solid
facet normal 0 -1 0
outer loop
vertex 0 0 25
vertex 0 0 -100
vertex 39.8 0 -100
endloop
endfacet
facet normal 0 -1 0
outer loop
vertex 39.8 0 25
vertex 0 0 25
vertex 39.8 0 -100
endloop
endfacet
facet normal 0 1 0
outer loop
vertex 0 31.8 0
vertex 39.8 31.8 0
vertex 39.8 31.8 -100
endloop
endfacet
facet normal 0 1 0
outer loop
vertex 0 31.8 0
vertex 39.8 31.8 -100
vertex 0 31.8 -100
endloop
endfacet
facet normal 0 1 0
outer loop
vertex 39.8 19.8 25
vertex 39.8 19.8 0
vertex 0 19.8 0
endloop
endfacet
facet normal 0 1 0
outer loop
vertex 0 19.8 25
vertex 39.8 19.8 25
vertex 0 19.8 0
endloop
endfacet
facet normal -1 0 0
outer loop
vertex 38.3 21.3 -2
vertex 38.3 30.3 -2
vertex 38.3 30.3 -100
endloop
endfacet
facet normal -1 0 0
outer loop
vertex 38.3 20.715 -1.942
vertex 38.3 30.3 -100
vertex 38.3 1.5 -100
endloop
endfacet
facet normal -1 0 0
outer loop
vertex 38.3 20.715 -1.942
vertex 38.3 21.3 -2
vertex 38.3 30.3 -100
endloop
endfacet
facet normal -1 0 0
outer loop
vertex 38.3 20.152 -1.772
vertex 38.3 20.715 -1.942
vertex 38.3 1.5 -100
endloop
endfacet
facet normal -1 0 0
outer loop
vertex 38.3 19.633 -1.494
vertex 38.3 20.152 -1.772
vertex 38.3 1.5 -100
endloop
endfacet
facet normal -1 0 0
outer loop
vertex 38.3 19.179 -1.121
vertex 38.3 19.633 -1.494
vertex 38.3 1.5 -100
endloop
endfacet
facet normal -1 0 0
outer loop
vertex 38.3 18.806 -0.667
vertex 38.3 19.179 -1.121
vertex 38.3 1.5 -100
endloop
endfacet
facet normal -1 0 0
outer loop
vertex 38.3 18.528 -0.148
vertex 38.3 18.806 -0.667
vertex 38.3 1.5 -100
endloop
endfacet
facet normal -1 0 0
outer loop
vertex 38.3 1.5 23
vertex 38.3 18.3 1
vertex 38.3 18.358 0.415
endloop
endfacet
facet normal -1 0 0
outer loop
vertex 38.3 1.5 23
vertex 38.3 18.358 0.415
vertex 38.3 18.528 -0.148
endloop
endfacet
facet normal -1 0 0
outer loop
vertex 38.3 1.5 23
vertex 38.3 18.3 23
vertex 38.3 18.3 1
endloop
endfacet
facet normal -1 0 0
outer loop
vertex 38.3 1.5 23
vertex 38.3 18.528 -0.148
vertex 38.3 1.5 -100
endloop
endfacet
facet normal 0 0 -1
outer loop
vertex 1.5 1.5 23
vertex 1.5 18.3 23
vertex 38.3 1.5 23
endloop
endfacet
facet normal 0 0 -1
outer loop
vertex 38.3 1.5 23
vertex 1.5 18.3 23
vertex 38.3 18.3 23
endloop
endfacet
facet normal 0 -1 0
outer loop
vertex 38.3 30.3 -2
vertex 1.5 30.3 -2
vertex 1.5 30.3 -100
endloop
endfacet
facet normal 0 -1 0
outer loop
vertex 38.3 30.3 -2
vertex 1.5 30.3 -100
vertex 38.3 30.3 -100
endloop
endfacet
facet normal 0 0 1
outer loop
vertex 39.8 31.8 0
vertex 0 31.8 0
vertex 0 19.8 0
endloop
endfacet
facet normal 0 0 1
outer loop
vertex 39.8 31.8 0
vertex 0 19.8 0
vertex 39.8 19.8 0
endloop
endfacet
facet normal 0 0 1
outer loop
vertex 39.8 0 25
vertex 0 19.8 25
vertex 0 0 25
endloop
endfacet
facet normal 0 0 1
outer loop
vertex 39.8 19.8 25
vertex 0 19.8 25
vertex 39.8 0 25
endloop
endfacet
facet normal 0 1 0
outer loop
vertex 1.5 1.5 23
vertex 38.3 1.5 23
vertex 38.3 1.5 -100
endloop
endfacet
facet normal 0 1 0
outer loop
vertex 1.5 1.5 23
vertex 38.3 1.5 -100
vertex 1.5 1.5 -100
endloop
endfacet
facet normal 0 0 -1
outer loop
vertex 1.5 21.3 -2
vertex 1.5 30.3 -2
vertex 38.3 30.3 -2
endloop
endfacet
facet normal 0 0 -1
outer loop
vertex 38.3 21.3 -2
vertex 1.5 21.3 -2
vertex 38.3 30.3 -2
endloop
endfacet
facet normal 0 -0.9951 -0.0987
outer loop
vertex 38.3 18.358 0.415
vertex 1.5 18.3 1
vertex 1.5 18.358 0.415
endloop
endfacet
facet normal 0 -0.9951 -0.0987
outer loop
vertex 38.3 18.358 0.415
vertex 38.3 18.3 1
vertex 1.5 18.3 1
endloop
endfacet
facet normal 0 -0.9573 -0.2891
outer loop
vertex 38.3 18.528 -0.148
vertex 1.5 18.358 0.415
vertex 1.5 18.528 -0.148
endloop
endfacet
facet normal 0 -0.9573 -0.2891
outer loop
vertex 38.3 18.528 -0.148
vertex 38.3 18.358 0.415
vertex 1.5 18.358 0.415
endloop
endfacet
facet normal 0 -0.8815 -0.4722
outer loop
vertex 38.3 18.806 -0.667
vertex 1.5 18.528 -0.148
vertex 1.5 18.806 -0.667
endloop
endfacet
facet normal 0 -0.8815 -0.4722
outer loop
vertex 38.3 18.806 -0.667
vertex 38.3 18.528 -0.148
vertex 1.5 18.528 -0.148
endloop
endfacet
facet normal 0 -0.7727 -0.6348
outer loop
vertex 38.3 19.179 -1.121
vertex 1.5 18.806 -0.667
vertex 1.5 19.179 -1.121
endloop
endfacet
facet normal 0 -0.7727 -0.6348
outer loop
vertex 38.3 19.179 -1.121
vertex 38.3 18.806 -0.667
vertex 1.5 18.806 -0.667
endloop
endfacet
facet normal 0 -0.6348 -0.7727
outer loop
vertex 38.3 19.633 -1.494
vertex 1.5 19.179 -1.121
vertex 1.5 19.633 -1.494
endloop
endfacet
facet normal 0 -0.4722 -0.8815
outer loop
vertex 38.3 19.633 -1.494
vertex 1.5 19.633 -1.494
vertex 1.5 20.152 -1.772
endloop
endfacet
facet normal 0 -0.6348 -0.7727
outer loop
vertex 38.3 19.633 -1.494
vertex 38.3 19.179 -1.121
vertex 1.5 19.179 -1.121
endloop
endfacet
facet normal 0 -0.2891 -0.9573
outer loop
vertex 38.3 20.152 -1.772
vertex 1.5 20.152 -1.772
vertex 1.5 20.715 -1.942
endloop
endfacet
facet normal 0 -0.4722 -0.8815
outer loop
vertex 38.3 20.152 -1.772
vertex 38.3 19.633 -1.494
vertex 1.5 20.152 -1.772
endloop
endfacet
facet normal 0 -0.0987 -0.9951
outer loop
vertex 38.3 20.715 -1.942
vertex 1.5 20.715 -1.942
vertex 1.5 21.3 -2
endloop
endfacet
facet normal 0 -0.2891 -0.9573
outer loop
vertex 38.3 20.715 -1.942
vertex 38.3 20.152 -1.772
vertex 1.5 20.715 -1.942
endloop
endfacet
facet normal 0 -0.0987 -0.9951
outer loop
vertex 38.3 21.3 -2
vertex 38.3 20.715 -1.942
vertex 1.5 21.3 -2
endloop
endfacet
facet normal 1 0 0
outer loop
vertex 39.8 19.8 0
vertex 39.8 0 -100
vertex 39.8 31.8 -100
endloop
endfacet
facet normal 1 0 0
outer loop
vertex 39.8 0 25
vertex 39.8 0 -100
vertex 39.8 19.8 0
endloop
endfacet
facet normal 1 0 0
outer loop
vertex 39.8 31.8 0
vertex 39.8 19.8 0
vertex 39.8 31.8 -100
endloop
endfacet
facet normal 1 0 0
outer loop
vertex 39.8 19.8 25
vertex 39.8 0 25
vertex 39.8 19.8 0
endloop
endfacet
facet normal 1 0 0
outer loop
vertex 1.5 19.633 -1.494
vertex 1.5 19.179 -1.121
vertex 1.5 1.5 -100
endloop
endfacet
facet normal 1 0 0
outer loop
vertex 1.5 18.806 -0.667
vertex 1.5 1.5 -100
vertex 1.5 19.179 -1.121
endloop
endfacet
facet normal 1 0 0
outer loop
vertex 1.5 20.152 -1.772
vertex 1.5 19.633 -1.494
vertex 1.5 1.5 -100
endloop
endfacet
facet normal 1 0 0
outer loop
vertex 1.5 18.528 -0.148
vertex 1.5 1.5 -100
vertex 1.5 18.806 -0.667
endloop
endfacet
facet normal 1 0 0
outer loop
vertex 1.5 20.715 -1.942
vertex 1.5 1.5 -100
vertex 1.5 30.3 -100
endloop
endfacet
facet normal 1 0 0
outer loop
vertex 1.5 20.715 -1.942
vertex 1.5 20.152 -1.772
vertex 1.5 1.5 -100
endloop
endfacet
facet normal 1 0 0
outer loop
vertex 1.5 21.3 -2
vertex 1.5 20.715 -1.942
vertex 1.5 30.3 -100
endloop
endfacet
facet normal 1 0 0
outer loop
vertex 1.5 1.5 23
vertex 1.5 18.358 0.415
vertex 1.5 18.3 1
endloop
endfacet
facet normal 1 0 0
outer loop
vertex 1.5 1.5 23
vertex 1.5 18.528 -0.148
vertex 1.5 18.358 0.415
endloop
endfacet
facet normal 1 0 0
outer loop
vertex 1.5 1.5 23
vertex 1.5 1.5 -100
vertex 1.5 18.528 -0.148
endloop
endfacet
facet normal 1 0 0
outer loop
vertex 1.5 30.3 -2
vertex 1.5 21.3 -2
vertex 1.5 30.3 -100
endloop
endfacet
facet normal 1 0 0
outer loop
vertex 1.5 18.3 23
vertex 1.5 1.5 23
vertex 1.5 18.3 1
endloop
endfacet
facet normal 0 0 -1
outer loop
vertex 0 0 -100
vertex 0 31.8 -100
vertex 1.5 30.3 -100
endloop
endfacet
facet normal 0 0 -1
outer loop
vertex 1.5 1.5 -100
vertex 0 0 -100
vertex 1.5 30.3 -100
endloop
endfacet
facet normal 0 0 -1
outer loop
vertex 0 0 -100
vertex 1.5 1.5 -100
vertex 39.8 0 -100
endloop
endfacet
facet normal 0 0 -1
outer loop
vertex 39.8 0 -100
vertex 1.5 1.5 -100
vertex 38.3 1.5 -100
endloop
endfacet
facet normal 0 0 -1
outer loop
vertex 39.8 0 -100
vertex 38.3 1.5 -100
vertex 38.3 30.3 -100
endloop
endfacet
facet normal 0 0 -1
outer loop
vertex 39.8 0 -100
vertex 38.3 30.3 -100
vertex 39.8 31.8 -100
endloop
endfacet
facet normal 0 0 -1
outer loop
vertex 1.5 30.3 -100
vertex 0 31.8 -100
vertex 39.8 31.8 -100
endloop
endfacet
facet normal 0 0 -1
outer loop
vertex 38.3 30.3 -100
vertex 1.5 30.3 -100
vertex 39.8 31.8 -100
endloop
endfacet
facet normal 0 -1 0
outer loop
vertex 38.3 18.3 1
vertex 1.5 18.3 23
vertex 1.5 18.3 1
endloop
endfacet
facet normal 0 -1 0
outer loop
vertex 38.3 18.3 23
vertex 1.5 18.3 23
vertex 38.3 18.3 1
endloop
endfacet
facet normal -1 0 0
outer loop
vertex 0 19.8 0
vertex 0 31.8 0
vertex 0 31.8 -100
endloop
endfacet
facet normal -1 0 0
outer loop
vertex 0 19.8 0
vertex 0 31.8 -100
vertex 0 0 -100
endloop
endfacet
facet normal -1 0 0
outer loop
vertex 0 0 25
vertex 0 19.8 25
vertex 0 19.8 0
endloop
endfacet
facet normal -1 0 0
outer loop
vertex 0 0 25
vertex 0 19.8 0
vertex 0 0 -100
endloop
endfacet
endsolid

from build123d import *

# Parameters (mm, degrees)
F0_W     = 36.8
F0_H     = 1.5
F0_W_2   = 1.5
F1_DEPTH = 25
F2_DEPTH = 100
F0_H_2   = 10.5
F3_DEPTH = 2
F4_R     = 3
F5_W     = 36.8
F5_H     = 16.8
F6_DEPTH = 2


with BuildPart() as f1:
    # F0 (on Top) → F1 (new body)
    with BuildSketch(Plane.XY):
        with Locations((19.9, 19.05)):
            Rectangle(F0_W, F0_H)
        with Locations((39.05, 19.05)):
            Rectangle(F0_W_2, F0_H)
        Polygon((0, 18.3), (0, 0), (39.8, 0), (39.8, 18.3), (38.3, 18.3), (38.3, 1.5), (1.5, 1.5), (1.5, 18.3), align=None)
        with Locations((0.75, 19.05)):
            Rectangle(F0_W_2, F0_H)
    extrude(amount=F1_DEPTH)

    # F0 (on Top) → F2 (join)
    with BuildSketch(Plane.XY):
        Polygon((0, 31.8), (0, 19.8), (1.5, 19.8), (1.5, 30.3), (38.3, 30.3), (38.3, 19.8), (39.8, 19.8), (39.8, 31.8), align=None)
        Polygon((0, 18.3), (0, 0), (39.8, 0), (39.8, 18.3), (38.3, 18.3), (38.3, 1.5), (1.5, 1.5), (1.5, 18.3), align=None)
        with Locations((39.05, 19.05)):
            Rectangle(F0_W_2, F0_H)
        with Locations((0.75, 19.05)):
            Rectangle(F0_W_2, F0_H)
    extrude(amount=-F2_DEPTH)

    # F0 (on Top) → F3 (join)
    with BuildSketch(Plane.XY):
        with Locations((19.9, 25.05)):
            Rectangle(F0_W, F0_H_2)
        with Locations((19.9, 19.05)):
            Rectangle(F0_W, F0_H)
    extrude(amount=-F3_DEPTH)

    # F4
    f4_edges = [f1.edges().sort_by_distance(p)[0] for p in [
        (19.9, 18.3, -2),
    ]]
    fillet(f4_edges, radius=F4_R)

    # F5 (on face) → F6 (join)
    with BuildSketch(Plane.XY.offset(25)):
        with Locations((19.9, 9.9)):
            Rectangle(F5_W, F5_H)
    extrude(amount=-F6_DEPTH)


solid = f1.part
